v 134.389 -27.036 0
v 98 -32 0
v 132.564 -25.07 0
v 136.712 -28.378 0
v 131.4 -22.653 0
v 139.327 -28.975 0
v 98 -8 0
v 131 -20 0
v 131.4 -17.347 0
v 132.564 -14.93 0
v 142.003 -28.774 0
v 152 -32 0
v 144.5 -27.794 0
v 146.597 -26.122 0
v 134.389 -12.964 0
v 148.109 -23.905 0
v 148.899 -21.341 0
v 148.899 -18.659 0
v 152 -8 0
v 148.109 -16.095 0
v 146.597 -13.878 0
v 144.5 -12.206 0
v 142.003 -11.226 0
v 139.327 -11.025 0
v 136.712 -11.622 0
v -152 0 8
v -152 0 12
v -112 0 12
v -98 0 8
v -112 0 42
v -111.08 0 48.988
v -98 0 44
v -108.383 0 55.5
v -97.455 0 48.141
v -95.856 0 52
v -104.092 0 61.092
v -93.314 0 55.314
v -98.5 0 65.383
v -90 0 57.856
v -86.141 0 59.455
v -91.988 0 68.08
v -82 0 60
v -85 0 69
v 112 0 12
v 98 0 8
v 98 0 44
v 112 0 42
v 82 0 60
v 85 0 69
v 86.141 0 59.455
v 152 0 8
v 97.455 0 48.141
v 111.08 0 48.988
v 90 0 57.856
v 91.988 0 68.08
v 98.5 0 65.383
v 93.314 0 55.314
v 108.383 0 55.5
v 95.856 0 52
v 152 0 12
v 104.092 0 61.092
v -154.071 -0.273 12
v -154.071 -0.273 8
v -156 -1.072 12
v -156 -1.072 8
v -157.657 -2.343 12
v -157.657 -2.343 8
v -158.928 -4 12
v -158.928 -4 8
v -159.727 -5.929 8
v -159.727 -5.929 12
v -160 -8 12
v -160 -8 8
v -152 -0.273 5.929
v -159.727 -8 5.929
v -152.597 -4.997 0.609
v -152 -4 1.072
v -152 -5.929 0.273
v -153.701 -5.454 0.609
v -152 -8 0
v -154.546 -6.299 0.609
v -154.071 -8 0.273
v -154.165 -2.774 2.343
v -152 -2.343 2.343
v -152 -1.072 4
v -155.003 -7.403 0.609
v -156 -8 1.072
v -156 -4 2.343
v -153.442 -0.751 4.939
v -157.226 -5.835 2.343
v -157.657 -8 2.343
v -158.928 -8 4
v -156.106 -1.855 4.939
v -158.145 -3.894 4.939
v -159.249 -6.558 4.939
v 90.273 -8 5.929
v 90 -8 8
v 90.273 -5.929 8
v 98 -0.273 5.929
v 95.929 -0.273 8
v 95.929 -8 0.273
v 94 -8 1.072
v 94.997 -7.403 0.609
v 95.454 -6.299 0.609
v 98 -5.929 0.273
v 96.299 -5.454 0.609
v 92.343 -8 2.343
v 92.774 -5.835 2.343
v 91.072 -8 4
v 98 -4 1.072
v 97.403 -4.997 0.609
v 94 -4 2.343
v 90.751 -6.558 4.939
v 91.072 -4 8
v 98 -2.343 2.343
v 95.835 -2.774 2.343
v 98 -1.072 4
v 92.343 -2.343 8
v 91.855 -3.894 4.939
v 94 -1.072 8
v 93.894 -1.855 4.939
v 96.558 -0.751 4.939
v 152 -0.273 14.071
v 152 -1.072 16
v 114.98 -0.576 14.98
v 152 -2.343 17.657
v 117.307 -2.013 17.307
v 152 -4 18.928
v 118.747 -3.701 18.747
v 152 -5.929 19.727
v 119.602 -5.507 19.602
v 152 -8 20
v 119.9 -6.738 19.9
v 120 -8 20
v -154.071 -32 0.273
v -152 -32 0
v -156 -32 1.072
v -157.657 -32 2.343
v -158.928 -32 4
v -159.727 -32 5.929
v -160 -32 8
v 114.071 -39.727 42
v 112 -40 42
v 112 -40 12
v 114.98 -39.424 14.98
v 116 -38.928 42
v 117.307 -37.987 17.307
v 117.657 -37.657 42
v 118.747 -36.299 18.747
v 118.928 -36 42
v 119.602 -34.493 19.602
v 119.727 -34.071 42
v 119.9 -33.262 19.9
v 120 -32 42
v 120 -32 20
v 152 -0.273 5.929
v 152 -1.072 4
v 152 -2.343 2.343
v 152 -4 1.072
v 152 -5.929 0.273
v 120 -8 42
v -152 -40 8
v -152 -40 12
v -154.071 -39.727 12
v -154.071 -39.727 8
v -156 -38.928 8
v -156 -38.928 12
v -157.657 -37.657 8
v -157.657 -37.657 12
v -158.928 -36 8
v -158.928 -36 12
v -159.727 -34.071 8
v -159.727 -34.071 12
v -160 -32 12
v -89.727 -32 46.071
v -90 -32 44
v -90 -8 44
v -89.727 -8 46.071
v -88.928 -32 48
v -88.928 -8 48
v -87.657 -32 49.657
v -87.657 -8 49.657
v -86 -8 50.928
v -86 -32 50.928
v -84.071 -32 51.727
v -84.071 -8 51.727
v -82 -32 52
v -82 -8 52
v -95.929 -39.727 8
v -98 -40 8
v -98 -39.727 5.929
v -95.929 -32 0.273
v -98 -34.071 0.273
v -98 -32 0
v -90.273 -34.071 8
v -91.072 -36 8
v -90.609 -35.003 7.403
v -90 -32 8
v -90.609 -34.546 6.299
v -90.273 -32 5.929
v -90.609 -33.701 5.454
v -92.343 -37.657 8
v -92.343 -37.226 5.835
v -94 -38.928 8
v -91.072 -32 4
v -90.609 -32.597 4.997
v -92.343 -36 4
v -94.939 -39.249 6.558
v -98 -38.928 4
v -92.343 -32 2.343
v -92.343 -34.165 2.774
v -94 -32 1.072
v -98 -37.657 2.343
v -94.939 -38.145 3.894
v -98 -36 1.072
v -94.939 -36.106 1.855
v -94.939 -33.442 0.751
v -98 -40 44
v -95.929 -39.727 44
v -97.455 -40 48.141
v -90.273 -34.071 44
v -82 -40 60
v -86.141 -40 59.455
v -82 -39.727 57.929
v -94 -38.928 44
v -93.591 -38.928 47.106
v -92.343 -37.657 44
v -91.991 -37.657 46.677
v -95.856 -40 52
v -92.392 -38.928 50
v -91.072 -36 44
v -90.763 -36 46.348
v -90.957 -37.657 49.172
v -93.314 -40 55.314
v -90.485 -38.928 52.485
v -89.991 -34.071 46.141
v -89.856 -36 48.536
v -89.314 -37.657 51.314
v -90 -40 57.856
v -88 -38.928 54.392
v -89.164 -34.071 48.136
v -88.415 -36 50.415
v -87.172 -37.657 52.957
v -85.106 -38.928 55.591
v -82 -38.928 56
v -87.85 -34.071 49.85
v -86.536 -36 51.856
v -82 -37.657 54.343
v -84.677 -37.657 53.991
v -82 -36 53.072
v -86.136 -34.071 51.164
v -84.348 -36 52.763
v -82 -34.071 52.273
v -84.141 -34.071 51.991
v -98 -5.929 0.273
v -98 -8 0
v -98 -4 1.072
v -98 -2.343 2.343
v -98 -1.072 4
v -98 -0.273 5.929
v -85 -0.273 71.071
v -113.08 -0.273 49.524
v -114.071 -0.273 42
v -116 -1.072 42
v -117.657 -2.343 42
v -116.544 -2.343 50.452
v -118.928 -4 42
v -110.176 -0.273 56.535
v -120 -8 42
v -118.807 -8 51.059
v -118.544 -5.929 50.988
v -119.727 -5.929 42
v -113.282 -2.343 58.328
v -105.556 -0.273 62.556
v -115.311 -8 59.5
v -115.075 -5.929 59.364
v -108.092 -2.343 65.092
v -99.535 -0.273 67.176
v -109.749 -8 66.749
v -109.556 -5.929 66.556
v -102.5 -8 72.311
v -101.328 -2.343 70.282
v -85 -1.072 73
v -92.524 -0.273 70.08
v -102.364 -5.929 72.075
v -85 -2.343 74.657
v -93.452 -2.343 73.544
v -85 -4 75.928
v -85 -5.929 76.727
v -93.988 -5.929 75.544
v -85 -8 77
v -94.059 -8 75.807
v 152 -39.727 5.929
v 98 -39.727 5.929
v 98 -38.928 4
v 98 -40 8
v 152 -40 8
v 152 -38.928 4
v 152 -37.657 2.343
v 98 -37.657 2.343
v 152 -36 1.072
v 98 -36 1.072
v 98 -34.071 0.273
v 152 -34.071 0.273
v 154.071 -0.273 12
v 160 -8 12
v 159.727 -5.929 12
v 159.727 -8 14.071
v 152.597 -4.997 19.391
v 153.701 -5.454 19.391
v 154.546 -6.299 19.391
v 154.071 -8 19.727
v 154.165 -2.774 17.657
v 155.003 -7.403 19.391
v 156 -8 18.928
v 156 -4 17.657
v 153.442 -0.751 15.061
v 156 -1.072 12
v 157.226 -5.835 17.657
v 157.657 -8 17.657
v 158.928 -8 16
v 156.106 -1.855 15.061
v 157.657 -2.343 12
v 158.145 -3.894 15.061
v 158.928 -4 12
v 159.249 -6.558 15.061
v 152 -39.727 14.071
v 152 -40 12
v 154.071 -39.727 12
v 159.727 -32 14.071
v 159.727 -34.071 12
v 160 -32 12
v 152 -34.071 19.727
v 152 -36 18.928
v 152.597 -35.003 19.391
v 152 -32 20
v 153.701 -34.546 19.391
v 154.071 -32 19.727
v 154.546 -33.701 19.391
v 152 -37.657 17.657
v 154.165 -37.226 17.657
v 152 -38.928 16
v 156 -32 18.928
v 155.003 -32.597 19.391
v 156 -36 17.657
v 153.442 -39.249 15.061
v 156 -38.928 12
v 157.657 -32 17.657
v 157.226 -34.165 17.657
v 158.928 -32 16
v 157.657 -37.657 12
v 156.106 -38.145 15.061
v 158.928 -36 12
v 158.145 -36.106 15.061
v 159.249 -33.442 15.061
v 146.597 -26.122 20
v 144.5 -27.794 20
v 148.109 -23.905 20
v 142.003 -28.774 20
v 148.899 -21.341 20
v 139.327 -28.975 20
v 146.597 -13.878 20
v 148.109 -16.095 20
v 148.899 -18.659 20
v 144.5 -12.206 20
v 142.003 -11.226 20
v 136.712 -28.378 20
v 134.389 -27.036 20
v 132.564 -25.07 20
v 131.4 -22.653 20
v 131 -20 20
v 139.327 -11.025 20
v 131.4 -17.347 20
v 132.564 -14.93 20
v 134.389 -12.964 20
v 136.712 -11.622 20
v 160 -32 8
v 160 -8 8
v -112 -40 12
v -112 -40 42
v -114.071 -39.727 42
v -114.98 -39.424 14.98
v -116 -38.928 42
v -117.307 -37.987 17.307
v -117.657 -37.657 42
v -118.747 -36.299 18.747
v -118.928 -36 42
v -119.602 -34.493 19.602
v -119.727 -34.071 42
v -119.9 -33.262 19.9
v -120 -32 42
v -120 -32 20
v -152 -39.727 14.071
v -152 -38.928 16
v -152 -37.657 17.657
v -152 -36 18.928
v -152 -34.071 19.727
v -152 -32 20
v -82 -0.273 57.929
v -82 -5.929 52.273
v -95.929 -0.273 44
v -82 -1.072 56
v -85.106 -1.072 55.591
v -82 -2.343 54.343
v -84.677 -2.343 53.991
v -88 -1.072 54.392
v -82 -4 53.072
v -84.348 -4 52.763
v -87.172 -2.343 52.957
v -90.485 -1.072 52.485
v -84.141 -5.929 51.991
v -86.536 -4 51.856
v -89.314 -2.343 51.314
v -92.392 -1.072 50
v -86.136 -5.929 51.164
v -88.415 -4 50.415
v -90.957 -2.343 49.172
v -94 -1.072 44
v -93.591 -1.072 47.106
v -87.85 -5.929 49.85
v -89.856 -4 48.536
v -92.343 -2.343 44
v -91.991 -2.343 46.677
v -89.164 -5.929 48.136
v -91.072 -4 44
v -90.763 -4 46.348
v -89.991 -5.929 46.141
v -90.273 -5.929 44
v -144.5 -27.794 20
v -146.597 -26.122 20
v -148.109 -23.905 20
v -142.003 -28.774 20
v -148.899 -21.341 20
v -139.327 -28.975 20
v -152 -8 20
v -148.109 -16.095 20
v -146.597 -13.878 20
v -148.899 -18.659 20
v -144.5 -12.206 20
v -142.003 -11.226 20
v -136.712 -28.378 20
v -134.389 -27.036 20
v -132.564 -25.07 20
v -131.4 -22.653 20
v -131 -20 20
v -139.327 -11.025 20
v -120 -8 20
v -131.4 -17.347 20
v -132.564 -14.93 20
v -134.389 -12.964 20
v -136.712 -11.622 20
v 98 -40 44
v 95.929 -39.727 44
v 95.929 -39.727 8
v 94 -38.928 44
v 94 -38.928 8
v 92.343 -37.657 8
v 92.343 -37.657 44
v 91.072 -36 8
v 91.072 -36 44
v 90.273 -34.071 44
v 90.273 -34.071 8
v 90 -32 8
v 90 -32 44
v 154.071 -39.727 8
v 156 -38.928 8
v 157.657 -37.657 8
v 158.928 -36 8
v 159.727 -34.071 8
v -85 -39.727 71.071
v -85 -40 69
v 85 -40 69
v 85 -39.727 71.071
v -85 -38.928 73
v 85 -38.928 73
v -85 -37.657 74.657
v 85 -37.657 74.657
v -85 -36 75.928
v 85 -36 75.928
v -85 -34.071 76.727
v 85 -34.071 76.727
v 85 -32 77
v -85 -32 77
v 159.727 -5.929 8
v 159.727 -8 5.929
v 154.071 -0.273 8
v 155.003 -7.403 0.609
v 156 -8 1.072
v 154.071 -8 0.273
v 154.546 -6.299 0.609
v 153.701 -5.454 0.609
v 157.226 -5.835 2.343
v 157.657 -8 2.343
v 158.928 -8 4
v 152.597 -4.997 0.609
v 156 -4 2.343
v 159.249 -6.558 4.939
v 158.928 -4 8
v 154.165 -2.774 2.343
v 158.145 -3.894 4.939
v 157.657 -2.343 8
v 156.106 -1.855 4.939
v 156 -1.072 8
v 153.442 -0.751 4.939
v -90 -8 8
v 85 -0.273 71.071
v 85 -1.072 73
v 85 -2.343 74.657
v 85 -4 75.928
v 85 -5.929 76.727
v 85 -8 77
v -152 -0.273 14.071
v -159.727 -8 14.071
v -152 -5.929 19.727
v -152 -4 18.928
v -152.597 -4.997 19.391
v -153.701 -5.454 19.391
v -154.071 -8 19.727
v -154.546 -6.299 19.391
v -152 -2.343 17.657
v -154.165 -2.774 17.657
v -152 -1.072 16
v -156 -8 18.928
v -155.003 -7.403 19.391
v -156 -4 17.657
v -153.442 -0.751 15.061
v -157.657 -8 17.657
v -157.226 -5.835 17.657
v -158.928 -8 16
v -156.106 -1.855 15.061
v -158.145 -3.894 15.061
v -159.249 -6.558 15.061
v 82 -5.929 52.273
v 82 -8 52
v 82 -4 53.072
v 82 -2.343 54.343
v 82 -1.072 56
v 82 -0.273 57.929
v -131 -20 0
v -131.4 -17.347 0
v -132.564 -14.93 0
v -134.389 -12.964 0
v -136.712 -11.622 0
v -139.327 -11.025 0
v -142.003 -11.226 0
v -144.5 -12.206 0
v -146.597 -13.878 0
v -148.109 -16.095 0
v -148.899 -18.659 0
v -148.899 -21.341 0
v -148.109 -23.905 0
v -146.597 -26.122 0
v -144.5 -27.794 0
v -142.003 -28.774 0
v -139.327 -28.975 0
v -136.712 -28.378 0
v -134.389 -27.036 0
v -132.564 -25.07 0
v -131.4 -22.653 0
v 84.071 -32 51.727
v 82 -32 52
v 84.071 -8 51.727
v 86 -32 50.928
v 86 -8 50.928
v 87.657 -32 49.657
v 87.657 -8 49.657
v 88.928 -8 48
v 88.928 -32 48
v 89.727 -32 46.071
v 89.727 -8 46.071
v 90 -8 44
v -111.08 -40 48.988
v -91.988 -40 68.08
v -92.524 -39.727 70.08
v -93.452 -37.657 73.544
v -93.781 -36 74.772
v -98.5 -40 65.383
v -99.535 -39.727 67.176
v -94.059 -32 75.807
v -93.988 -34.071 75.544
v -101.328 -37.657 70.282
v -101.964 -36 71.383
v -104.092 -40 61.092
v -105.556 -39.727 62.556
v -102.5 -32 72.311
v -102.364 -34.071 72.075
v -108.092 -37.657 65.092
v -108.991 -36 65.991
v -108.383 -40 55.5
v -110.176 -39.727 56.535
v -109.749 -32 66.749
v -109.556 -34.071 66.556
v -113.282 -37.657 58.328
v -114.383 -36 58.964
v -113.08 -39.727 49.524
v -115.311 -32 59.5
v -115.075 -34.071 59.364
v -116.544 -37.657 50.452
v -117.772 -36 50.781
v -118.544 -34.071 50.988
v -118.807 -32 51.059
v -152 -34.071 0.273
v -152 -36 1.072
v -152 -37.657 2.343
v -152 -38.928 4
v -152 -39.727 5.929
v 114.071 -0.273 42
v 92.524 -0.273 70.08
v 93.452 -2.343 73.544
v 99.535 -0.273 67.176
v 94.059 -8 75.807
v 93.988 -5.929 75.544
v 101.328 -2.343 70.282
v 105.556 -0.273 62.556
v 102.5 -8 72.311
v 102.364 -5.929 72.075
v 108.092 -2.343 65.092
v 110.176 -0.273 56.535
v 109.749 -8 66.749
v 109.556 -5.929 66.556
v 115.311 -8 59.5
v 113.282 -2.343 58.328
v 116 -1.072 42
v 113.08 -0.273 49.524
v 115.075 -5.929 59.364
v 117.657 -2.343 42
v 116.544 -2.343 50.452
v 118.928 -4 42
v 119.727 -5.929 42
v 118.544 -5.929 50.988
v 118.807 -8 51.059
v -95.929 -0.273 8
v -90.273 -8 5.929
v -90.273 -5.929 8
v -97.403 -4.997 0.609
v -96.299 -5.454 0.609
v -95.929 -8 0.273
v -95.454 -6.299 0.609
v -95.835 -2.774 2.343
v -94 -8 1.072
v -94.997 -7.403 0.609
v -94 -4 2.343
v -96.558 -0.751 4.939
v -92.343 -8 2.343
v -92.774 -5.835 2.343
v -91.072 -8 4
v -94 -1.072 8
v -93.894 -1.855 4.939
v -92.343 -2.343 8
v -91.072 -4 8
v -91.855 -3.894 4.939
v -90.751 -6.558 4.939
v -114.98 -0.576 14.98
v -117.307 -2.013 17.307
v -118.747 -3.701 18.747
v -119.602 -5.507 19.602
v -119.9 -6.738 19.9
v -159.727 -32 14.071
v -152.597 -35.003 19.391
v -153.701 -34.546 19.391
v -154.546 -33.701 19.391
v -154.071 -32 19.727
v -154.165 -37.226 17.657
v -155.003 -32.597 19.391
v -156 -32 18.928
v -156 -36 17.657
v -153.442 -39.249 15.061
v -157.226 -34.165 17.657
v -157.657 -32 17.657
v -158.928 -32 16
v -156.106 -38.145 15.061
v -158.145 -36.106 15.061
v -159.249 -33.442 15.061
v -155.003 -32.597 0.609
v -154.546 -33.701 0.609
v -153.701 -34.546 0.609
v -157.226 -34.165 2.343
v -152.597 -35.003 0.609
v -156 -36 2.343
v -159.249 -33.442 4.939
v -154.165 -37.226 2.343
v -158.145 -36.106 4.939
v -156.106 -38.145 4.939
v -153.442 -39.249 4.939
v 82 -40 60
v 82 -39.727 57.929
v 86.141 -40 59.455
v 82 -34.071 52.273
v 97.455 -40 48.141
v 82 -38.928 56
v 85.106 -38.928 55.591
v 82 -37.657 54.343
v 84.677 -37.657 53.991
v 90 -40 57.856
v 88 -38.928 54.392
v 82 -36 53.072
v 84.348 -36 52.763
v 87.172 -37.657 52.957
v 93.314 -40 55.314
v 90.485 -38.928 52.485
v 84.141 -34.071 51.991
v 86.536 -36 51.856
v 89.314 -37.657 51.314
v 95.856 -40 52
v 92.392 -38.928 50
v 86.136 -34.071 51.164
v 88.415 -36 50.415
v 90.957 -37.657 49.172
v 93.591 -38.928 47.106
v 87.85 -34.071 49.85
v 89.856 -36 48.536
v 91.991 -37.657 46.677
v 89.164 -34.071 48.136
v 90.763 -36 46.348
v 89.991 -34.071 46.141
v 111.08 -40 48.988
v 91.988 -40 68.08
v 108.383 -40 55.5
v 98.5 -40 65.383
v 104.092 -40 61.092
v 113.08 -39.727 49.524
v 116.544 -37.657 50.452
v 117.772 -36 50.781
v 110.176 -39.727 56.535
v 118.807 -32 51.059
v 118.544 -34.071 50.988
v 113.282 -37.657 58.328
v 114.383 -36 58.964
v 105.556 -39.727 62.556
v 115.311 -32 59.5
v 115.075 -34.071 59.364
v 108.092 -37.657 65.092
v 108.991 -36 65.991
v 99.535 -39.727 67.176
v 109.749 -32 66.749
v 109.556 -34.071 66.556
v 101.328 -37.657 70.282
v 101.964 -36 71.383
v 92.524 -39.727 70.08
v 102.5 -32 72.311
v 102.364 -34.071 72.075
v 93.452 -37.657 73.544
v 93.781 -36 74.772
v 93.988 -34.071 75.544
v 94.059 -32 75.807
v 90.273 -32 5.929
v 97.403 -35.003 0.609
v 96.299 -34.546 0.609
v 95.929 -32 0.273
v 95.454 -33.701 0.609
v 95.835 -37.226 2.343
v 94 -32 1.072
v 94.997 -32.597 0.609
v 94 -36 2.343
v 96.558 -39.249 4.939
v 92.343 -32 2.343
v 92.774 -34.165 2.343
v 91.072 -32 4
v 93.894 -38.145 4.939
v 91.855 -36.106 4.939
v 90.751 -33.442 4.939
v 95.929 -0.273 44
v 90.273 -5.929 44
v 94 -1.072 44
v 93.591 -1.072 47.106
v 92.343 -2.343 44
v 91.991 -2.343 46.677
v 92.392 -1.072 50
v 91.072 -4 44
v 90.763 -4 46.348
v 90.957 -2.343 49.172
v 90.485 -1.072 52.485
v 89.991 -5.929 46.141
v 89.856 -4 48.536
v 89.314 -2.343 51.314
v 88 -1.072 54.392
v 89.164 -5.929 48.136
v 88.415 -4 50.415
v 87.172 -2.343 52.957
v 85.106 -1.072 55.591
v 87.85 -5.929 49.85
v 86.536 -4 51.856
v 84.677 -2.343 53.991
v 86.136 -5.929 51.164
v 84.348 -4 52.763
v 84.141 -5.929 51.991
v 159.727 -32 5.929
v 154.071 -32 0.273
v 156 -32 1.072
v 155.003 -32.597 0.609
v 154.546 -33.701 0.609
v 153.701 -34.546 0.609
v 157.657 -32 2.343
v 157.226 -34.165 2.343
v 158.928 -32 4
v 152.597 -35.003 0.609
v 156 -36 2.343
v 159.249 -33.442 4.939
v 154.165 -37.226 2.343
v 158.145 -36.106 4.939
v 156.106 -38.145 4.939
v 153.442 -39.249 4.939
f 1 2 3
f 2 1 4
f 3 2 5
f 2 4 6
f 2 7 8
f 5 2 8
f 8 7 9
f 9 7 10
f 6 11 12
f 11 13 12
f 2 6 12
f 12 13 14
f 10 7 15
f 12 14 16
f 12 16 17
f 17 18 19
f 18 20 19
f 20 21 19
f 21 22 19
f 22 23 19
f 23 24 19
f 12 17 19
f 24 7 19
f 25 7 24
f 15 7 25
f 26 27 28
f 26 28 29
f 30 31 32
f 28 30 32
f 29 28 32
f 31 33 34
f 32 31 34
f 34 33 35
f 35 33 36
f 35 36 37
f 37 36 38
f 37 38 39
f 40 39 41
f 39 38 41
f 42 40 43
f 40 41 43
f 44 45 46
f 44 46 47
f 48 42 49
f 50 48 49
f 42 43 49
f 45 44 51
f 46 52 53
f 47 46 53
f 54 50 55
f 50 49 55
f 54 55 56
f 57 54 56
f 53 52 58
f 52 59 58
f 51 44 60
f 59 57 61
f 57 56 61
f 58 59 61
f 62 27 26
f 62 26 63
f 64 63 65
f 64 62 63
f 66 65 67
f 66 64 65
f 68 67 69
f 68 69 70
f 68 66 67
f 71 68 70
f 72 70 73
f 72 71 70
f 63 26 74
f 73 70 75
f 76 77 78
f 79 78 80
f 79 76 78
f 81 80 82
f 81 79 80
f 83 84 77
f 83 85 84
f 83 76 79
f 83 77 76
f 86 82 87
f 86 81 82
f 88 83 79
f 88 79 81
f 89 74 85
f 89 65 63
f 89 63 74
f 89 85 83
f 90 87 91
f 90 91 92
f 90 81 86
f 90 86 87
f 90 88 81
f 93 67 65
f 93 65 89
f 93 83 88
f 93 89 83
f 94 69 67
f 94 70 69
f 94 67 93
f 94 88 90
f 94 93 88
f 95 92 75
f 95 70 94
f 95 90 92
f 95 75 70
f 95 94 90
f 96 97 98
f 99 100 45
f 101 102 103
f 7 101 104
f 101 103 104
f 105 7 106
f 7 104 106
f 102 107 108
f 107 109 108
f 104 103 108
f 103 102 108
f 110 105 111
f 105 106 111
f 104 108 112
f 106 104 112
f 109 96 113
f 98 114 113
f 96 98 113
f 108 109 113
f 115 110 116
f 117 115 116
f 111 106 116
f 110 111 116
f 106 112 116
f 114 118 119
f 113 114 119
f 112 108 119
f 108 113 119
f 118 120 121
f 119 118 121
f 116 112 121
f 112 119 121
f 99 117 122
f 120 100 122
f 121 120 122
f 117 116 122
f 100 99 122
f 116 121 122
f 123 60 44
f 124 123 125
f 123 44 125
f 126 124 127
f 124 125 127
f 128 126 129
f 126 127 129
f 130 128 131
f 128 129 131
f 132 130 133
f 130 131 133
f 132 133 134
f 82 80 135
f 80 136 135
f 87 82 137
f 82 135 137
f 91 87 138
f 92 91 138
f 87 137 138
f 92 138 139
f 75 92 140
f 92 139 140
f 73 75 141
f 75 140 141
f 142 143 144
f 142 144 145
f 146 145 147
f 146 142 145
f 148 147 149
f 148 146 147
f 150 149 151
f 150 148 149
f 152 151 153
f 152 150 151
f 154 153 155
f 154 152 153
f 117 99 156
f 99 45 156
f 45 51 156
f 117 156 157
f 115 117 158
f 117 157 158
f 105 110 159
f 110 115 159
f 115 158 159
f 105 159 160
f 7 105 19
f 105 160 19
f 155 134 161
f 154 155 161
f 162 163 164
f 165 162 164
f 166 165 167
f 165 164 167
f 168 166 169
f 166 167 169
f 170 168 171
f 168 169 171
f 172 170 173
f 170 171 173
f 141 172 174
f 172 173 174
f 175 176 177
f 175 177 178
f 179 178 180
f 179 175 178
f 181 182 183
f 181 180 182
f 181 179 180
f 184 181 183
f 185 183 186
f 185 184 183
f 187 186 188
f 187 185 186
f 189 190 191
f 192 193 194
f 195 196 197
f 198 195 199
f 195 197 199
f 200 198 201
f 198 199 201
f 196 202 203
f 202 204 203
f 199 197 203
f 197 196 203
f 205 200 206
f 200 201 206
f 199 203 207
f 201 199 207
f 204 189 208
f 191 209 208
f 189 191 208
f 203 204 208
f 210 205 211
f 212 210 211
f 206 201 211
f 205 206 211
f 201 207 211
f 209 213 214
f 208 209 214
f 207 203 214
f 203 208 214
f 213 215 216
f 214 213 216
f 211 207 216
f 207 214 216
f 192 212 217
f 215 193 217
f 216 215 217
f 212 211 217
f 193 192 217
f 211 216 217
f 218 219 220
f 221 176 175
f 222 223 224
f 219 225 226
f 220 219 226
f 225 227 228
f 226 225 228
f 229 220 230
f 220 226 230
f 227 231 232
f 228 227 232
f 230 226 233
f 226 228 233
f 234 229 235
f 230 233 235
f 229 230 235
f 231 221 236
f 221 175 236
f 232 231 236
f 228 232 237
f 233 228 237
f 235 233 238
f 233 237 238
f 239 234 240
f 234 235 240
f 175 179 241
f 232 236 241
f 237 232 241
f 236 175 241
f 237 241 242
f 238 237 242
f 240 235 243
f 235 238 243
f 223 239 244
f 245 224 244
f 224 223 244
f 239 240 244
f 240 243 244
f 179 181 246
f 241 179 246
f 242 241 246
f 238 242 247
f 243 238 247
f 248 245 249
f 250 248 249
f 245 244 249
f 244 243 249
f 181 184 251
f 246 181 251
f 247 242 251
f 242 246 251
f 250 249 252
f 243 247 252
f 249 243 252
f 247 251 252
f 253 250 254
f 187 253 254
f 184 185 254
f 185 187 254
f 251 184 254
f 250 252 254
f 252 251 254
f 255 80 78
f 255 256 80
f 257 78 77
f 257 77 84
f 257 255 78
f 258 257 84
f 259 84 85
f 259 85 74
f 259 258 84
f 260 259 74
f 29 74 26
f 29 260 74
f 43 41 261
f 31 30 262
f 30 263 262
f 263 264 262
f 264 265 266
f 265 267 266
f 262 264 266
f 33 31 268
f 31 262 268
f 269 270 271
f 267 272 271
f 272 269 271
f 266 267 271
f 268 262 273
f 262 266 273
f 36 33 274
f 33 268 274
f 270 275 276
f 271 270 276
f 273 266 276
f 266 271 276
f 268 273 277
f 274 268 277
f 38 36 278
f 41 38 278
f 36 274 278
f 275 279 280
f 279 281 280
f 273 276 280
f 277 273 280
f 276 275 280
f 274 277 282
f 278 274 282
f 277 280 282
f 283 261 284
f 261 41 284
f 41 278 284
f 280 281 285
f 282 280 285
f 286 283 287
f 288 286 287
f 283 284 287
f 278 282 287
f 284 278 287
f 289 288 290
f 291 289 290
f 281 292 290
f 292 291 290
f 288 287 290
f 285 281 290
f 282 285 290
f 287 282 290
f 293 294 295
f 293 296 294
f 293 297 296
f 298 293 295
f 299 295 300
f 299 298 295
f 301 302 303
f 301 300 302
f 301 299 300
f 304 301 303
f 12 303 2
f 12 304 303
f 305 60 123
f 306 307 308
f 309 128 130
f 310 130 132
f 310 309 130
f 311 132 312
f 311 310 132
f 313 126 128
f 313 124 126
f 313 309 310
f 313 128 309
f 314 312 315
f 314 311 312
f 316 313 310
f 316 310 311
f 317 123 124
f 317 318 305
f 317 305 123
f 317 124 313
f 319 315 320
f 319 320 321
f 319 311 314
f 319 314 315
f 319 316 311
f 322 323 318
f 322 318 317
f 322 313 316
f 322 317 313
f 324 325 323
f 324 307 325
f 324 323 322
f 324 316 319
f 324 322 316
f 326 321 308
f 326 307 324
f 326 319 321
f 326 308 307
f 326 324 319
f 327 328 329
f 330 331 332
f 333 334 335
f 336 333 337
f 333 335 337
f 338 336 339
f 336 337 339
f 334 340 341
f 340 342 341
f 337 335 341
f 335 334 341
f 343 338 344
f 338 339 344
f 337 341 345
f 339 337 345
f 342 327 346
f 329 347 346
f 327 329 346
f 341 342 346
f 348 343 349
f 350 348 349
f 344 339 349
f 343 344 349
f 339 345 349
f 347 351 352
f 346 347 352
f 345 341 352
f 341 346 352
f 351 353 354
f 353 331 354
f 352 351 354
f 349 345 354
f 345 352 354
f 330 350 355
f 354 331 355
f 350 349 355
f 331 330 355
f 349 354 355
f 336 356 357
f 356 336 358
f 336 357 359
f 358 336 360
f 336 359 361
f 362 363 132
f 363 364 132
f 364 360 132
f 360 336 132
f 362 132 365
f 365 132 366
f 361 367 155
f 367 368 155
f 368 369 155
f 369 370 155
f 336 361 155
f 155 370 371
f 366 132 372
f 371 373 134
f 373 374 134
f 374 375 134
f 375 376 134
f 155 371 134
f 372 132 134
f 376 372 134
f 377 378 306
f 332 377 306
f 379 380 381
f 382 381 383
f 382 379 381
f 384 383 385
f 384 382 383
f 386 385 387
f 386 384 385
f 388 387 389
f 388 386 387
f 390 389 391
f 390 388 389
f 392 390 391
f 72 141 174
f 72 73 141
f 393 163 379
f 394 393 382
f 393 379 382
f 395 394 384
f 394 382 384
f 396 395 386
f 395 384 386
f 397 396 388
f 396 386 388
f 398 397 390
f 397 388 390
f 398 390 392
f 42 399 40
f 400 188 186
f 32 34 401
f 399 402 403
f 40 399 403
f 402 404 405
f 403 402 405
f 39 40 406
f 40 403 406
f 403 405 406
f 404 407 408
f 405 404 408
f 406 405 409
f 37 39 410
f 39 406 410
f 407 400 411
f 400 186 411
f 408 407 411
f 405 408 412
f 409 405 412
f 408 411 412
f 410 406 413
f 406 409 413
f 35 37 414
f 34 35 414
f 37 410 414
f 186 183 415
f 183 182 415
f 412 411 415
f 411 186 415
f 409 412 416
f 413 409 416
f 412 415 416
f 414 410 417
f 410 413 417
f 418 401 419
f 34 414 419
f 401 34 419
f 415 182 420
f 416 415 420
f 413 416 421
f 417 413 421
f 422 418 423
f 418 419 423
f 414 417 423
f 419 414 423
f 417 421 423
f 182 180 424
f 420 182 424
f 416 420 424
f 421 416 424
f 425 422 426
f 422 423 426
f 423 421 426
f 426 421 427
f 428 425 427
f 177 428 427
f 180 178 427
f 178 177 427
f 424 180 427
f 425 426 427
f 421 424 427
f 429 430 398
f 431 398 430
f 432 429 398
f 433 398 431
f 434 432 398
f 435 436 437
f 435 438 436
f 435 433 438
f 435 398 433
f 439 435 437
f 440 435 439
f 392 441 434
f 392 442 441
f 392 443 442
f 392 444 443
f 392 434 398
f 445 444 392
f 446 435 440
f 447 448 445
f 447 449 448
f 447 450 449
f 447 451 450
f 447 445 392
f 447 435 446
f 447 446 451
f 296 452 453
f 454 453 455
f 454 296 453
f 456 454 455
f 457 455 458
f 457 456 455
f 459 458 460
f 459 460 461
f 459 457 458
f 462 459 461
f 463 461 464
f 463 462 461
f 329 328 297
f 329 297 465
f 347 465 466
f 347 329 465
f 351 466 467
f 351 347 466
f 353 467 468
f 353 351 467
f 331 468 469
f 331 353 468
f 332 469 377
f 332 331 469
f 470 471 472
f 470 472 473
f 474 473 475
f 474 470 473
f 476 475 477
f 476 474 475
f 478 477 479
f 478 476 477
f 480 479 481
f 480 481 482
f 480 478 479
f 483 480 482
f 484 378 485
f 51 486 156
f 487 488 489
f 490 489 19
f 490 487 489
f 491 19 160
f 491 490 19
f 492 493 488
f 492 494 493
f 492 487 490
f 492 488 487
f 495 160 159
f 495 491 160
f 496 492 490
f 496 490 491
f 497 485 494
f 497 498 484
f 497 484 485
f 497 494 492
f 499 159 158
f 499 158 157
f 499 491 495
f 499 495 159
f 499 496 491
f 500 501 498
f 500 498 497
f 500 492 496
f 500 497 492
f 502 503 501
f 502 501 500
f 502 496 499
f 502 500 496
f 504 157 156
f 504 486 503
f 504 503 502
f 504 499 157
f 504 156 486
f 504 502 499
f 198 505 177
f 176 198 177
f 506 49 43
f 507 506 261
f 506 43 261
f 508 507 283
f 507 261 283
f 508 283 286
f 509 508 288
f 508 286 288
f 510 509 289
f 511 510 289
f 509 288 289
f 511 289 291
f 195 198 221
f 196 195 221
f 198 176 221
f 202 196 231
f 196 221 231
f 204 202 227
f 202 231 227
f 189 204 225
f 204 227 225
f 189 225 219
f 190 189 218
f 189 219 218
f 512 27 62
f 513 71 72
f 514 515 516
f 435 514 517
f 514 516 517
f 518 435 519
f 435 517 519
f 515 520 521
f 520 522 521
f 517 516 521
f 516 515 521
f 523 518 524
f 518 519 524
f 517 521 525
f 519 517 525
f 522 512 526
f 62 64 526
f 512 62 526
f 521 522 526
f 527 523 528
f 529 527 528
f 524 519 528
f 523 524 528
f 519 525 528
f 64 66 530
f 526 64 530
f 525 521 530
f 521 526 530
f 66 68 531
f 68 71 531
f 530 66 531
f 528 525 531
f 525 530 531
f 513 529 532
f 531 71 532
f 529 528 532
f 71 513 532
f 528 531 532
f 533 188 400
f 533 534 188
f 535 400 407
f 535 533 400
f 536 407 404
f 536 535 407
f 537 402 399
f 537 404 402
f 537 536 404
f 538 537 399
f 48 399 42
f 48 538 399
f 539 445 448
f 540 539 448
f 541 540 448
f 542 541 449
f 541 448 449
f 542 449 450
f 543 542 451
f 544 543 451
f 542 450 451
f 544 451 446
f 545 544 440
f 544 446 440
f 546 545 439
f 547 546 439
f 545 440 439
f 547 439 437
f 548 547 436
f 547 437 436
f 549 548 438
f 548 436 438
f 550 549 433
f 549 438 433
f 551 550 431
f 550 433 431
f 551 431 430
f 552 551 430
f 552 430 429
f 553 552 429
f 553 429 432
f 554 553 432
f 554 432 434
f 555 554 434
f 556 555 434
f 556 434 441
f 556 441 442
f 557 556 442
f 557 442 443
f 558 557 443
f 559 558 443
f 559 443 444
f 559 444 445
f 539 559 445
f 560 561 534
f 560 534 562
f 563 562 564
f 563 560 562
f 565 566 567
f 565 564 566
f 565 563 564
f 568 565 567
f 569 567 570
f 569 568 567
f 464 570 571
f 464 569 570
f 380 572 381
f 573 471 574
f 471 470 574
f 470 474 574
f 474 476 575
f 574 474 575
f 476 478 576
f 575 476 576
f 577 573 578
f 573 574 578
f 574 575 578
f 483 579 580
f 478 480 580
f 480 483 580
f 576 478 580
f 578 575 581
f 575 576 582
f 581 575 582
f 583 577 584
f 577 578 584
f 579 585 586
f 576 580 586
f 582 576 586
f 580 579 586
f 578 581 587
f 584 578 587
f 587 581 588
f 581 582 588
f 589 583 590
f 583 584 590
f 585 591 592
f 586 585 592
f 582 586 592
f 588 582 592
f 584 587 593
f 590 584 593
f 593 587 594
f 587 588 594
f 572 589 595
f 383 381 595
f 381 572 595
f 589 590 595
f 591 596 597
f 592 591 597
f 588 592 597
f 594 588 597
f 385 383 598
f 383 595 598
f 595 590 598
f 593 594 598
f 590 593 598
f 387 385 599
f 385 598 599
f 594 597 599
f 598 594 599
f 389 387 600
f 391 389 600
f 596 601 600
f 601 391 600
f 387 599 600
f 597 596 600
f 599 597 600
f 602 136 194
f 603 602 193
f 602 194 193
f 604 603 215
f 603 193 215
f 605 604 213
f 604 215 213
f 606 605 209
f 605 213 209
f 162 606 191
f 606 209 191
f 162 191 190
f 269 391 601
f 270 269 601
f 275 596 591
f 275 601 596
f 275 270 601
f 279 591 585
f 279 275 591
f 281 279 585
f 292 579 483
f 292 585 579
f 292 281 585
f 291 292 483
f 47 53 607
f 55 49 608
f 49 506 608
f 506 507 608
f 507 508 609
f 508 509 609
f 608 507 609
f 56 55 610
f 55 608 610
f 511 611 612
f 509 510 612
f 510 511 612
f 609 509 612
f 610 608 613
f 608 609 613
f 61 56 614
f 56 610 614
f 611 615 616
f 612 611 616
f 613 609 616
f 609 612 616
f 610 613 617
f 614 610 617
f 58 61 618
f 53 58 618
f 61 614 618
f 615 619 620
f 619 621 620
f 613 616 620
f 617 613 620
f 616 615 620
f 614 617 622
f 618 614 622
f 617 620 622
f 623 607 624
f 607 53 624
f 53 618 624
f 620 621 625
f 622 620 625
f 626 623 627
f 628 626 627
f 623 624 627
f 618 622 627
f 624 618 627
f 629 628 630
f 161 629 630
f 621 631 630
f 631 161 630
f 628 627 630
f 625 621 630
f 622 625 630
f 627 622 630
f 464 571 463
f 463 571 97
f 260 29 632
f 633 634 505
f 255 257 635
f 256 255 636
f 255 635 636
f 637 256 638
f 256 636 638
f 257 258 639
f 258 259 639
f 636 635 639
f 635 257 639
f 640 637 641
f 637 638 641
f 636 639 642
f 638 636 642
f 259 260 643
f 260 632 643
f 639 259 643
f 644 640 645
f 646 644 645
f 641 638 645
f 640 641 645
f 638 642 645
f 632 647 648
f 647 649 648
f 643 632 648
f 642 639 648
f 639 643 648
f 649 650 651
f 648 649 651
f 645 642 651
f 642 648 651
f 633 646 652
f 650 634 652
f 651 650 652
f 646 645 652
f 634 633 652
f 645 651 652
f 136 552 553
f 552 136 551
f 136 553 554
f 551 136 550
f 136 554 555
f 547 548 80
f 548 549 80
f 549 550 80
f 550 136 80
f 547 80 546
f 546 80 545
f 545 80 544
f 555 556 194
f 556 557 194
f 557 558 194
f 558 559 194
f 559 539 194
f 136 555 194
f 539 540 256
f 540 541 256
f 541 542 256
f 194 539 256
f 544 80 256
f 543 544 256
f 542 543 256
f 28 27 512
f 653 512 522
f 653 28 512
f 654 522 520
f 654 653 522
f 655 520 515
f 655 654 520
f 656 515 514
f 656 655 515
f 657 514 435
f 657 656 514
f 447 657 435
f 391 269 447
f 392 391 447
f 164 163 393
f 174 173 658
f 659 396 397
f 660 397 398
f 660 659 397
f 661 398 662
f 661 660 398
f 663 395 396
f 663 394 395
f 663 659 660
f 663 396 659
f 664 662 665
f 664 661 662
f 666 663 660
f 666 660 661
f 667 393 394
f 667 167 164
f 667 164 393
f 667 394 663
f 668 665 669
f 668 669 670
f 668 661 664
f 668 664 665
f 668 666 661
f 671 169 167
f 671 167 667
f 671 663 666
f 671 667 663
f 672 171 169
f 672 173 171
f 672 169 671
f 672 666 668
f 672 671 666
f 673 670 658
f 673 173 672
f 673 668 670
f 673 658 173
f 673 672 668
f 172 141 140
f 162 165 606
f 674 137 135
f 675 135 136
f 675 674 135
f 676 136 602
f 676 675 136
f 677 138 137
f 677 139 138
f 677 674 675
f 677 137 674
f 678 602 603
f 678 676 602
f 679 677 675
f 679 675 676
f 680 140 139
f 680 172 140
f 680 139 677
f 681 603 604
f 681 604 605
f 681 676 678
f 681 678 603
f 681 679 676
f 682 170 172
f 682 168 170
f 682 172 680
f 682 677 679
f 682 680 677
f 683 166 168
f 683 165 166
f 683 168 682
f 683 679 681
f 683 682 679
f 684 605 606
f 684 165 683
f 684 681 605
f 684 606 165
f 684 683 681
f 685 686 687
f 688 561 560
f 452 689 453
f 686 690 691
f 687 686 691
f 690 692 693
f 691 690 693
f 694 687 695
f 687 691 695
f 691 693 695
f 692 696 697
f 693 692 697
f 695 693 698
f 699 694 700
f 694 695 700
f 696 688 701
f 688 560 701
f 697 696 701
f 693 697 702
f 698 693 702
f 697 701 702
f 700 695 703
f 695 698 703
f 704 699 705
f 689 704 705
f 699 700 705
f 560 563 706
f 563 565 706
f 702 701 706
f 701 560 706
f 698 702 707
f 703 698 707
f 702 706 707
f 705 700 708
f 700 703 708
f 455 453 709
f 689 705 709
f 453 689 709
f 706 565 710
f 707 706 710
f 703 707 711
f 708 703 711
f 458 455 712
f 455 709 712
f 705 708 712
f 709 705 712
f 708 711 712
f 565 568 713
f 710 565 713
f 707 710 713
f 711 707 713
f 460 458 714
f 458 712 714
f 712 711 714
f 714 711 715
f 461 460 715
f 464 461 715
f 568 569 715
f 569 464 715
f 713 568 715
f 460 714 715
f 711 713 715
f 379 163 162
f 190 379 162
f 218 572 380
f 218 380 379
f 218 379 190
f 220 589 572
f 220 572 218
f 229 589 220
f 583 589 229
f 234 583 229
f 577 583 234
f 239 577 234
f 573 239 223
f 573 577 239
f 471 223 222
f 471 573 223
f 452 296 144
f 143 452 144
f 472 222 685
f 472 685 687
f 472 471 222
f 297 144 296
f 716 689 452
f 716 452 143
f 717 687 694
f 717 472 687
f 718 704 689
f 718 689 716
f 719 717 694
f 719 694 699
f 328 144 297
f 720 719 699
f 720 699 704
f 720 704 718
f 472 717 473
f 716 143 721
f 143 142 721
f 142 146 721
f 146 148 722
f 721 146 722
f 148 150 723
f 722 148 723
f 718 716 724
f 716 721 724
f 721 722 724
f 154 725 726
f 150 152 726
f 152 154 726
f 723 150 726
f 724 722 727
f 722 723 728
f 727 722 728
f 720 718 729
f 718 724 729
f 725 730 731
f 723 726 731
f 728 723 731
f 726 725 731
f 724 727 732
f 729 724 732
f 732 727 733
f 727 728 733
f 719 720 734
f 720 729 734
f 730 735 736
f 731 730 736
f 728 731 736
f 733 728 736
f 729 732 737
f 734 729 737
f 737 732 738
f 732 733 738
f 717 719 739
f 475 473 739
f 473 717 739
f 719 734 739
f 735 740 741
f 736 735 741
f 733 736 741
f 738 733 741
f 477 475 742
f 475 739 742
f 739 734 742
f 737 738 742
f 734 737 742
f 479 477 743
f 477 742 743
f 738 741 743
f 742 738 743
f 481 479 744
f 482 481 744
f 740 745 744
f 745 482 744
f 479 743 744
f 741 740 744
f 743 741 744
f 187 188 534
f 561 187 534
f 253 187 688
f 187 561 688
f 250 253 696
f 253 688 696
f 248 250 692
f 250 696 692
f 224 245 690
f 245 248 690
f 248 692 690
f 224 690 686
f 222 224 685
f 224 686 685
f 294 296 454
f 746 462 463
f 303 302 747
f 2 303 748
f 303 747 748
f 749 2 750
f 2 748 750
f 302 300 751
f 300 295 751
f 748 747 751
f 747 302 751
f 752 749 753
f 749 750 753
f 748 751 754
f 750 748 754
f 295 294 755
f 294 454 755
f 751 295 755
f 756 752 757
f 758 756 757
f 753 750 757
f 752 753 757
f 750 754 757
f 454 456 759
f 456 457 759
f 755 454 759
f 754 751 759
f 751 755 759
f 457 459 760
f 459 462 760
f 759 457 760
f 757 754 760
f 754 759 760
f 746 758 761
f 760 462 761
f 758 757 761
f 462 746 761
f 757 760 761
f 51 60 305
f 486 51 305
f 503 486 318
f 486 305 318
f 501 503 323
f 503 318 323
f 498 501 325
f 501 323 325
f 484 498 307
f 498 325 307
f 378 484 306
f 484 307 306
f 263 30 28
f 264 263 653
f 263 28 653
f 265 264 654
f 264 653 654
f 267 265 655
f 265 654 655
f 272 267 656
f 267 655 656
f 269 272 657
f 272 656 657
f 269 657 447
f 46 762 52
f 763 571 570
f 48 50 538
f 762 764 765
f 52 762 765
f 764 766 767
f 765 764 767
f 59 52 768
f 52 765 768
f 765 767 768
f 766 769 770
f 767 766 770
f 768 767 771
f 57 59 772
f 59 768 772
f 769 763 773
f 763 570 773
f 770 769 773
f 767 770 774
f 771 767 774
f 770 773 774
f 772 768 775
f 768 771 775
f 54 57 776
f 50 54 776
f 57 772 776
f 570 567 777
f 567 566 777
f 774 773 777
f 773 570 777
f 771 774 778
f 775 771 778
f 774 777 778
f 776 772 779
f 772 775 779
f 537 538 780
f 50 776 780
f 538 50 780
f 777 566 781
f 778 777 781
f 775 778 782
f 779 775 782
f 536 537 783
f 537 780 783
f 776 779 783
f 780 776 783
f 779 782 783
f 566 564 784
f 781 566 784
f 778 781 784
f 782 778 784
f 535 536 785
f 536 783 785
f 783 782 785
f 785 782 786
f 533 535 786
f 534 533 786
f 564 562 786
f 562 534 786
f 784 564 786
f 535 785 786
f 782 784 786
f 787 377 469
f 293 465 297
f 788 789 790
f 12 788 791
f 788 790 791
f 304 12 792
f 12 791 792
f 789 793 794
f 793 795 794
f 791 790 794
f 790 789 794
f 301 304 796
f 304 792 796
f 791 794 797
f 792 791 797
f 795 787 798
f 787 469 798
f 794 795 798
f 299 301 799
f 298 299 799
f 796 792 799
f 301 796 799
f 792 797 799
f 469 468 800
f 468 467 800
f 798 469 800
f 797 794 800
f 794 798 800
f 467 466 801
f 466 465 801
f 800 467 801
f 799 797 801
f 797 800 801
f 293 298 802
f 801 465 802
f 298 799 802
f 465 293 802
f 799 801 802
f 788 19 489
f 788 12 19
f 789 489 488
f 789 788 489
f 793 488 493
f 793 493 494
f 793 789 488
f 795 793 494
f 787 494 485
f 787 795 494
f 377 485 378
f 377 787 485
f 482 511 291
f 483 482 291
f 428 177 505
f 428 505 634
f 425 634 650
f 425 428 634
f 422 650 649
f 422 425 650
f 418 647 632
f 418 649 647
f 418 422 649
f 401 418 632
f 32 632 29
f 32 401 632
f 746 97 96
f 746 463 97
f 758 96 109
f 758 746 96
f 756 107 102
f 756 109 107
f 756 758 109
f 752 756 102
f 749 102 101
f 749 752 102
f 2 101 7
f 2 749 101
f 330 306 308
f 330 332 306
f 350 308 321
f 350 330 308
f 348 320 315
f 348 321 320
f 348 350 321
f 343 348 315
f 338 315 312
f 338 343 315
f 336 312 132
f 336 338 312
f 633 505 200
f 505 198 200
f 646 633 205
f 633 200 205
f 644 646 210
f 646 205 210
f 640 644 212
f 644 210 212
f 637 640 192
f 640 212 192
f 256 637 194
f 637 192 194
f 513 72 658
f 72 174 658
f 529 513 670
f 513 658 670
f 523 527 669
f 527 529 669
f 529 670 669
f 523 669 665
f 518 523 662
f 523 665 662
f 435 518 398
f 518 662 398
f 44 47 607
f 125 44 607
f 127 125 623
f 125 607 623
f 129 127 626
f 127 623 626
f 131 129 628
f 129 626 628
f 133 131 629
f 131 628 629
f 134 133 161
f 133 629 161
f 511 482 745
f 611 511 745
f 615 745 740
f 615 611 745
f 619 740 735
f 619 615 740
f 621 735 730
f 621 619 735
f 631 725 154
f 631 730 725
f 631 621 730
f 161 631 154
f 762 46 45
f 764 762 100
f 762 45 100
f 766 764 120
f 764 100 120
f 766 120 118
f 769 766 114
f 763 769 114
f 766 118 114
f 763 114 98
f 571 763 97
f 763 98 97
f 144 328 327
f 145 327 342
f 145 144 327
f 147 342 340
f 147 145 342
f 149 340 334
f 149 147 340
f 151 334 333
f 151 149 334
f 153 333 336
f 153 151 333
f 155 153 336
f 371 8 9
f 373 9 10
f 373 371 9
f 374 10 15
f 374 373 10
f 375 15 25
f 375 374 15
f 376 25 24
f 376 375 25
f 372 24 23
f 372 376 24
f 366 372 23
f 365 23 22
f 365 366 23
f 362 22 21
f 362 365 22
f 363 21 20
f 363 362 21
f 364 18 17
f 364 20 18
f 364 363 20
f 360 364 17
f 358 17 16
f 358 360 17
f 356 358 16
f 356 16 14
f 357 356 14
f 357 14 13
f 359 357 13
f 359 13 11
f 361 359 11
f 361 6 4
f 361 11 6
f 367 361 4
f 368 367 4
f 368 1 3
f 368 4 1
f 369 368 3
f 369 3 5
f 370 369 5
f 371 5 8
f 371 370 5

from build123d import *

# Parameters (mm, degrees)
F0_W         = 40
F0_H         = 20
F1_DEPTH     = 40
F2_R         = 9
F3_DEPTH     = 74.7
F4_R         = 8
F5_T1_DEPTH  = 40
F5_T4_ANGLE  = 90
F5_T6_ANGLE  = 90
F5_T8_ANGLE  = 90
F5_T10_ANGLE = 90


# Not quite as in the source:
# - a fillet or chamfer that OpenCascade refuses, or shapes differently, is made with other operations: its cross-section is extruded or revolved along the edge and cut away or added
# - a pattern or mirror of a feature is missing from the dataset's text; its kind, count and spacing are read off the source's solid


with BuildPart() as f1:
    # F0 (on Front) → F1 (new body)
    with BuildSketch(Plane.XZ):
        Polygon((-120, 20), (-120, 0), (-90, 0), (-90, 52), (0, 52), (90, 52), (90, 0), (120, 0), (160, 0), (160, 20), (120, 20), (120, 52), (120, 77), (0, 77), (-120, 77), (-120, 52), align=None)
        with Locations((-140, 10)):
            Rectangle(F0_W, F0_H)
    extrude(amount=F1_DEPTH)

    # F2 (on face) → F3 (cut)
    with BuildSketch(Plane.XY.offset(20)):
        with Locations((-140, -20)):
            Circle(F2_R)
    f3 = extrude(amount=-F3_DEPTH, mode=Mode.SUBTRACT)

    # F3_copies: F3 across plane
    add(f3.mirror(Plane(origin=(0, 0, 0), x_dir=(0, 0, 1), z_dir=(1, 0, 0))), mode=Mode.SUBTRACT)

    # F4
    f4_edges = [f1.edges().sort_by_distance(p)[0] for p in [
        (-160, -40, 10),
        (-160, 0, 10),
        (160, 0, 10),
        (160, -40, 10),
        (140, 0, 20),
        (120, 0, 48.5),
        (0, 0, 77),
        (-120, 0, 48.5),
        (-140, 0, 20),
        (-140, -40, 20),
        (-120, -40, 48.5),
        (0, -40, 77),
        (120, -40, 48.5),
        (140, -40, 20),
        (160, -20, 20),
        (160, -20, 0),
        (90, 0, 26),
        (0, 0, 52),
        (-90, 0, 26),
        (-125, 0, 0),
        (-160, -20, 0),
        (-125, -40, 0),
        (-90, -40, 26),
        (0, -40, 52),
        (90, -40, 26),
        (125, -40, 0),
        (90, -20, 0),
        (90, -20, 52),
        (-90, -20, 52),
        (-160, -20, 20),
        (125, 0, 0),
        (-90, -20, 0),
    ]]
    fillet(f4_edges, radius=F4_R)

    # F5: fillet of radius 35 on 2 edges, made by hand

    # F5_s2 → F5_t1 (cut)
    with BuildSketch(Plane.XZ):
        with BuildLine():
            ThreePointArc((-120, 42), (-109.7487373415, 66.7487373415), (-85, 77))
            Line((-85, 77), (-120, 77))
            Line((-120, 77), (-120, 42))
        make_face()
        with BuildLine():
            ThreePointArc((85, 77), (109.7487373415, 66.7487373415), (120, 42))
            Line((120, 42), (120, 77))
            Line((120, 77), (85, 77))
        make_face()
    extrude(amount=F5_T1_DEPTH, mode=Mode.SUBTRACT)

    # F5_s3 → F5_t4 (revolve, cut)
    with BuildSketch(Plane.YZ.offset(85)):
        with BuildLine():
            ThreePointArc((0, 69), (-2.3431457505, 74.6568542495), (-8, 77))
            Line((-8, 77), (0, 77))
            Line((0, 77), (0, 69))
        make_face()
    revolve(axis=Axis((85, 0, 42), (0, 1, 0)), revolution_arc=F5_T4_ANGLE, mode=Mode.SUBTRACT)

    # F5_s5 → F5_t6 (revolve, cut)
    with BuildSketch(Plane.XY.offset(42)):
        with BuildLine():
            ThreePointArc((112, -40), (117.6568542495, -37.6568542495), (120, -32))
            Line((120, -32), (120, -40))
            Line((120, -40), (112, -40))
        make_face()
    revolve(axis=Axis((85, -40, 42), (0, -1, 0)), revolution_arc=F5_T6_ANGLE, mode=Mode.SUBTRACT)

    # F5_s7 → F5_t8 (revolve, cut)
    with BuildSketch(Plane.XY.offset(42)):
        with BuildLine():
            ThreePointArc((-112, 0), (-117.6568542495, -2.3431457505), (-120, -8))
            Line((-120, -8), (-120, 0))
            Line((-120, 0), (-112, 0))
        make_face()
    revolve(axis=Axis((-85, 0, 42), (0, 1, 0)), revolution_arc=F5_T8_ANGLE, mode=Mode.SUBTRACT)

    # F5_s9 → F5_t10 (revolve, cut)
    with BuildSketch(Plane.YZ.offset(-85)):
        with BuildLine():
            ThreePointArc((-40, 69), (-37.6568542495, 74.6568542495), (-32, 77))
            Line((-32, 77), (-40, 77))
            Line((-40, 77), (-40, 69))
        make_face()
    revolve(axis=Axis((-85, -40, 42), (0, -1, 0)), revolution_arc=F5_T10_ANGLE, mode=Mode.SUBTRACT)


solid = f1.part
